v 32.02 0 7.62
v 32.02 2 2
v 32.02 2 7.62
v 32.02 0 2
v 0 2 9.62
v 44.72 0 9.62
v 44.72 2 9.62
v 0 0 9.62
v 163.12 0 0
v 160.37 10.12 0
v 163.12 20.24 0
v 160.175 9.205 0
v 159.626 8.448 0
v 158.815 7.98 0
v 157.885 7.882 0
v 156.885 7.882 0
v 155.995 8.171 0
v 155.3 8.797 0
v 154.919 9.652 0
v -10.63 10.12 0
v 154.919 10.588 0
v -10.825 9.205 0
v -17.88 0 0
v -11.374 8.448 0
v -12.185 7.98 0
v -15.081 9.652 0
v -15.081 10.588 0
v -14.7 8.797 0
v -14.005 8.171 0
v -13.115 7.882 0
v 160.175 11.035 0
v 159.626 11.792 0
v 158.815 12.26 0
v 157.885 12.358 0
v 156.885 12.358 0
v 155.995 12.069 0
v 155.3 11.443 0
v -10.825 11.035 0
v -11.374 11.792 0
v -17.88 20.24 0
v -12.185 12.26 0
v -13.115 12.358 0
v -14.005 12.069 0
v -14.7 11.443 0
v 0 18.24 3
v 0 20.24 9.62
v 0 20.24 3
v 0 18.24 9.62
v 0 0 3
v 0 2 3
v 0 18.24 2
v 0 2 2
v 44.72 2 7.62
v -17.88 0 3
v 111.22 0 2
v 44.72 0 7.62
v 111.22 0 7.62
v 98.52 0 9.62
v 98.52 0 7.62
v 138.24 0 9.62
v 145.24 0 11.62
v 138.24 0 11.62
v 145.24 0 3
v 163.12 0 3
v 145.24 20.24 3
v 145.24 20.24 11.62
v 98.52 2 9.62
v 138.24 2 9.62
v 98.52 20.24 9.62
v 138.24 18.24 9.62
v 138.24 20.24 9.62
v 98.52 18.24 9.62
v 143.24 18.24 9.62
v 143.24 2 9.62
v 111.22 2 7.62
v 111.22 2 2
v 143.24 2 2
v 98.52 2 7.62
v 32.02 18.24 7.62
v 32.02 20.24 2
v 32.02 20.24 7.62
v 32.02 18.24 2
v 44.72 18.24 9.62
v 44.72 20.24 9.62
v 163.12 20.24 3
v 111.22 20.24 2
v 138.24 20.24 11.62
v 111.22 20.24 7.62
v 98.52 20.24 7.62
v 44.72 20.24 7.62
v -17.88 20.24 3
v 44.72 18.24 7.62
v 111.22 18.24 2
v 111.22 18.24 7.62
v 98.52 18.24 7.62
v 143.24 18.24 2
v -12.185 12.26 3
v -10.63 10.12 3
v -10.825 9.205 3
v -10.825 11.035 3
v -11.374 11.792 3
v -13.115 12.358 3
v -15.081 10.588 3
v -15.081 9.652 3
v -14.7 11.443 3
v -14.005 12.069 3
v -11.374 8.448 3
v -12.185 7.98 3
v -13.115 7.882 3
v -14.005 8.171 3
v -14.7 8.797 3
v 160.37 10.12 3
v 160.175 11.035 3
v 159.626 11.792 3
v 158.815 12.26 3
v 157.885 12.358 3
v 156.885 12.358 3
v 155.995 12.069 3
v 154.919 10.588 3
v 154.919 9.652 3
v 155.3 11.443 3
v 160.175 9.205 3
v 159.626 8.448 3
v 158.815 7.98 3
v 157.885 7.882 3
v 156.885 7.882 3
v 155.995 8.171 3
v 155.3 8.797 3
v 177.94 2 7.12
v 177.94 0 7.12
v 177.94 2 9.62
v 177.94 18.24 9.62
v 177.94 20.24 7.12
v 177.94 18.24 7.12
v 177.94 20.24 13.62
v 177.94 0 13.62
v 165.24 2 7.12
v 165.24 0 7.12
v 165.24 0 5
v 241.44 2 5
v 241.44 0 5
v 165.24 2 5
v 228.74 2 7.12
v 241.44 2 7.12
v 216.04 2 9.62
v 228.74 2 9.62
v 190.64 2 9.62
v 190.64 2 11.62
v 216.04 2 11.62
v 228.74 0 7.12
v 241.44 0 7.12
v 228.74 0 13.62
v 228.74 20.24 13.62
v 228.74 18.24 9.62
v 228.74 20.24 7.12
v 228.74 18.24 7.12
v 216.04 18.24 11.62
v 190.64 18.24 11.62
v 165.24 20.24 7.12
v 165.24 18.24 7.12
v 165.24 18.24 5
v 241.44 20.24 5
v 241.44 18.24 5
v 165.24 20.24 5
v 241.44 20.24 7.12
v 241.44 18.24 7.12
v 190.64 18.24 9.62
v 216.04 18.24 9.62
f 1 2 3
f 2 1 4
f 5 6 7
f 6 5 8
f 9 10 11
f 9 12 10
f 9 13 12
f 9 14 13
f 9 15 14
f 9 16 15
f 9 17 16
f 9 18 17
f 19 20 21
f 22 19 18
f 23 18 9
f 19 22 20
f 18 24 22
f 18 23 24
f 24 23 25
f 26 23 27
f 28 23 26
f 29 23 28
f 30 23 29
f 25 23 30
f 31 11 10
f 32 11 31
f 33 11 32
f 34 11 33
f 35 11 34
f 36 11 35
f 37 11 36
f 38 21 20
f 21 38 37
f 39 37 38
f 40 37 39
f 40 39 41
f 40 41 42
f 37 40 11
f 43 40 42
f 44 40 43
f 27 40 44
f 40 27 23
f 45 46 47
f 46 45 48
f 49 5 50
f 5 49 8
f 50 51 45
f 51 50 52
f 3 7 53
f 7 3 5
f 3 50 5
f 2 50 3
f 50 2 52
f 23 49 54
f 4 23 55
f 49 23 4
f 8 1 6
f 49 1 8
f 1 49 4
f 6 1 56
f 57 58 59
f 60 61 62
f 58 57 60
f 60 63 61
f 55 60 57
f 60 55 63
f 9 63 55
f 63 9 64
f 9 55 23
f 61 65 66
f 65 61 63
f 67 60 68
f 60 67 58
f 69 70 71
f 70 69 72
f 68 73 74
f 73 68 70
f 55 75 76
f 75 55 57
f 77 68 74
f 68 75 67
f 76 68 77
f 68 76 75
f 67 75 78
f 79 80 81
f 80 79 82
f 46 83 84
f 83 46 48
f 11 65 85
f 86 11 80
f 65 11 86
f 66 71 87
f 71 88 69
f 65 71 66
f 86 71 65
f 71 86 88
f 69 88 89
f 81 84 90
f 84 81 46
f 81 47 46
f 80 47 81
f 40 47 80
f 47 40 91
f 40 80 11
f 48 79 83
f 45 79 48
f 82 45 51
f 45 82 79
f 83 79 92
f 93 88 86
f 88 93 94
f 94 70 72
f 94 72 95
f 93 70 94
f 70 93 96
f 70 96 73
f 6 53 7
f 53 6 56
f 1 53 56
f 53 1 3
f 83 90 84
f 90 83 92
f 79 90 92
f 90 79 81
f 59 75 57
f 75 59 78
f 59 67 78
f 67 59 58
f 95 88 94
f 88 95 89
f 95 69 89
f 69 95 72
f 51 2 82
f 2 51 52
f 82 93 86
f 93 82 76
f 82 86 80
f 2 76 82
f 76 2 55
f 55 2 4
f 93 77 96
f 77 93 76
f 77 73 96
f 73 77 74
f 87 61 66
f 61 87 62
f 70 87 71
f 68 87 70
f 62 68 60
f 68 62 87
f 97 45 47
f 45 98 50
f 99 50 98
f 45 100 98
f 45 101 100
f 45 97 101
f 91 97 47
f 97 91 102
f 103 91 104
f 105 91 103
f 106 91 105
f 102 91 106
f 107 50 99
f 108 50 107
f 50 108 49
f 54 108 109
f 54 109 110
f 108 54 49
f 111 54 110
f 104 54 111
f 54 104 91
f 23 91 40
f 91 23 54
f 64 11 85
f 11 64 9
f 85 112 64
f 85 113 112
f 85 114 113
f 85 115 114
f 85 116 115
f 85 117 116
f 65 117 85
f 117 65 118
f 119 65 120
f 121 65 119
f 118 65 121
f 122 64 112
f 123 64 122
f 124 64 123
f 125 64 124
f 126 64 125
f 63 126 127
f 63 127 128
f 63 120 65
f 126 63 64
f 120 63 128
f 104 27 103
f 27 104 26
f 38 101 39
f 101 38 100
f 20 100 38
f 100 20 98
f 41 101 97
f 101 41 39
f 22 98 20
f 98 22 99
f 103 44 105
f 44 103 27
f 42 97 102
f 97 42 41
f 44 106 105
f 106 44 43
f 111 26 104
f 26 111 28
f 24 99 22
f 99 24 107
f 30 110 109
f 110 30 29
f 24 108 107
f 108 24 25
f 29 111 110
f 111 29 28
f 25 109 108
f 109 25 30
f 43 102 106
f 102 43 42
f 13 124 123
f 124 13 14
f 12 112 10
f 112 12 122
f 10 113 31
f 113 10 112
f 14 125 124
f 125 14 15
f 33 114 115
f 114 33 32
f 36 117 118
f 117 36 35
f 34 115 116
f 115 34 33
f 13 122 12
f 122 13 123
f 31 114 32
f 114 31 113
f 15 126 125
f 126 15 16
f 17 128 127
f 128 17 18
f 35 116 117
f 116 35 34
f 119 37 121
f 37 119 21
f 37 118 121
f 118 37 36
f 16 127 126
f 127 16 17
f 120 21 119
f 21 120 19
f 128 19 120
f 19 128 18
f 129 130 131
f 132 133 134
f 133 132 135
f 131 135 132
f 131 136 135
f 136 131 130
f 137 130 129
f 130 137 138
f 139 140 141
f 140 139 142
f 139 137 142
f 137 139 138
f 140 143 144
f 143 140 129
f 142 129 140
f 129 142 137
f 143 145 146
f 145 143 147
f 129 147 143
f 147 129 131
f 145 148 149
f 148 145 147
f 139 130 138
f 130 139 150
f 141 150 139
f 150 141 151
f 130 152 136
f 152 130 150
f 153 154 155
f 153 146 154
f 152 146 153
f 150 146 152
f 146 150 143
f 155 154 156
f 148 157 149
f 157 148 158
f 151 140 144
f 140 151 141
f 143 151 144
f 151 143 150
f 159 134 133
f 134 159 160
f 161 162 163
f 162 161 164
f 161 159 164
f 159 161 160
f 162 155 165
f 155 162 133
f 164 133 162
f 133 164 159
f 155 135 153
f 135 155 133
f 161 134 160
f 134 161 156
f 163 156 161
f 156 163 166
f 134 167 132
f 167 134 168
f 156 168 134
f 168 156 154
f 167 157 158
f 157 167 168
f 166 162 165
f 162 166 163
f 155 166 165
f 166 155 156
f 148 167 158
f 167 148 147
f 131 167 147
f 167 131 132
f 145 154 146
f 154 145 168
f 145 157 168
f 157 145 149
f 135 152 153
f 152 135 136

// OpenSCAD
// Housing for an Andamiro Pump It Up sensor (5.6 x 0.6 x 0.3 in), designed to
// fit in US DDR X2 pads.
// tray: open-top holder with slide-in cover interlock + mount tabs.
// cover: inverted-U cap that presses the sensor; slides under the tray_interlock.

$fa = 1;
$fs = 1;

// all constants are in mm

// sensor size
sensor_len = 142.24;
sensor_width = 15.24;
sensor_height = 7.62;

// ---- tray body ----
tray_wall_thickness = 2;
// per-side clearance
sensor_clearance = 0.5;
tray_floor_thickness = 2;
end_roof_len = 5;

// ---- mount tabs ----
hole_spacing = 171;
hole_diameter = 4.5;
roof_hole_play = 1;
tab_thickness = 3;
// material past each hole center
tab_margin = 5;

// ---- cover ----
cover_len = 76.2;
cover_wall_to_floor_gap = 3;
window_play = 1.5;       // lengthwise play between cover and side_wall_gap
interlock_len = 12.7;
tray_interlock_height = 2;   // tray wall ledge that captures the cover
contact_pad_height = 2;  // sensor-contact pad height
interlock_clearance = 0.5; // vertical gap so the cover slides under the tray_interlock

cavity_len = sensor_len + 2 * sensor_clearance;
cavity_width = sensor_width + 2 * sensor_clearance;
tray_width = cavity_width + 2 * tray_wall_thickness;
wall_height = tray_floor_thickness + sensor_height;
side_wall_gap = cover_len + 2 * window_play;
side_wall_gap_start = (cavity_len - side_wall_gap) / 2;
side_wall_gap_end = (cavity_len + side_wall_gap) / 2;
cover_wall_height = sensor_height + contact_pad_height - cover_wall_to_floor_gap; // roof sits on the pads, so cover is lifted by pad height
cover_z = tray_floor_thickness + cover_wall_to_floor_gap;
cover_interlock_height = wall_height - tray_interlock_height - interlock_clearance - cover_z; // top clears the tray_interlock
tray_len = cavity_len + tray_wall_thickness;
tab_len = hole_spacing / 2 - tray_len / 2 + tab_margin;

module tray() {
	difference() {
		union() {
			// floor
			cube([cavity_len + tray_wall_thickness, tray_width, tray_floor_thickness]);
			// far wall to keep one end of sensor in place
			translate([cavity_len, 0, 0]) {
				cube([tray_wall_thickness, tray_width, wall_height]);
			}
			// far roof to keep one end of sensor in place
			translate([cavity_len - end_roof_len, 0, wall_height]) {
				cube([end_roof_len + tray_wall_thickness, tray_width, tray_wall_thickness]);
			}
			// side walls, split by the side_wall_gap
			for (y = [0, tray_width - tray_wall_thickness]) {
				translate([0, y, 0]) {
					cube([side_wall_gap_start, tray_wall_thickness, wall_height]);
				}
				translate([side_wall_gap_end, y, 0]) {
					cube([cavity_len + tray_wall_thickness - side_wall_gap_end, tray_wall_thickness, wall_height]);
				}
			}
			// tray_interlock ledges at both ends of the side_wall_gap
			for (x = [side_wall_gap_start, side_wall_gap_end - interlock_len]) {
				for (y = [0, tray_width - tray_wall_thickness]) {
					translate([x, y, wall_height - tray_interlock_height]) {
						cube([interlock_len, tray_wall_thickness, tray_interlock_height]);
					}
				}
			}
			// mount tabs for screws
			translate([-tab_len, 0, 0]) {
				cube([tab_len, tray_width, tab_thickness]);
			}
			translate([tray_len, 0, 0]) {
				cube([tab_len, tray_width, tab_thickness]);
			}
		}
		// left screw hole
		translate([tray_len / 2 - hole_spacing / 2, tray_width / 2, -1]) {
			cylinder(d = hole_diameter, h = tab_thickness + 2);
		}
		// roof-side screw slot with lengthwise play toward tray center
		hull() {
			for (x = [tray_len / 2 + hole_spacing / 2, tray_len / 2 + hole_spacing / 2 - roof_hole_play]) {
				translate([x, tray_width / 2, -1]) {
					cylinder(d = hole_diameter, h = tab_thickness + 2);
				}
			}
		}
	}
}

module cover() {
	// cover walls; both ends notched so they slide under the tray_interlock
	for (y = [0, tray_width - tray_wall_thickness]) {
		translate([-cover_len / 2, y, 0]) {
			cube([interlock_len, tray_wall_thickness, cover_interlock_height]);
		}
		translate([-cover_len / 2 + interlock_len, y, 0]) {
			cube([cover_len - 2 * interlock_len, tray_wall_thickness, cover_wall_height]);
		}
		translate([cover_len / 2 - interlock_len, y, 0]) {
			cube([interlock_len, tray_wall_thickness, cover_interlock_height]);
		}
	}
	// roof between the notched ends
	translate([-cover_len / 2 + interlock_len, 0, cover_wall_height]) {
		cube([cover_len - 2 * interlock_len, tray_width, tray_wall_thickness]);
	}
	// sensor-contact pads at both ends under roof
    // (to reduce contact area between cover and sensor for more sensitivity)
	for (x = [-cover_len / 2 + interlock_len, cover_len / 2 - 2 * interlock_len]) {
		translate([x, tray_wall_thickness, cover_wall_height - contact_pad_height]) {
			cube([interlock_len, tray_width - 2 * tray_wall_thickness, contact_pad_height]);
		}
	}
}

part = "both";

if (part == "tray") {
	tray();
} else if (part == "cover") {
	cover();
} else {
	tray();
	translate([cavity_len + tray_wall_thickness + 20 + cover_len / 2, 0, cover_z]) {
		cover();
	}
}
